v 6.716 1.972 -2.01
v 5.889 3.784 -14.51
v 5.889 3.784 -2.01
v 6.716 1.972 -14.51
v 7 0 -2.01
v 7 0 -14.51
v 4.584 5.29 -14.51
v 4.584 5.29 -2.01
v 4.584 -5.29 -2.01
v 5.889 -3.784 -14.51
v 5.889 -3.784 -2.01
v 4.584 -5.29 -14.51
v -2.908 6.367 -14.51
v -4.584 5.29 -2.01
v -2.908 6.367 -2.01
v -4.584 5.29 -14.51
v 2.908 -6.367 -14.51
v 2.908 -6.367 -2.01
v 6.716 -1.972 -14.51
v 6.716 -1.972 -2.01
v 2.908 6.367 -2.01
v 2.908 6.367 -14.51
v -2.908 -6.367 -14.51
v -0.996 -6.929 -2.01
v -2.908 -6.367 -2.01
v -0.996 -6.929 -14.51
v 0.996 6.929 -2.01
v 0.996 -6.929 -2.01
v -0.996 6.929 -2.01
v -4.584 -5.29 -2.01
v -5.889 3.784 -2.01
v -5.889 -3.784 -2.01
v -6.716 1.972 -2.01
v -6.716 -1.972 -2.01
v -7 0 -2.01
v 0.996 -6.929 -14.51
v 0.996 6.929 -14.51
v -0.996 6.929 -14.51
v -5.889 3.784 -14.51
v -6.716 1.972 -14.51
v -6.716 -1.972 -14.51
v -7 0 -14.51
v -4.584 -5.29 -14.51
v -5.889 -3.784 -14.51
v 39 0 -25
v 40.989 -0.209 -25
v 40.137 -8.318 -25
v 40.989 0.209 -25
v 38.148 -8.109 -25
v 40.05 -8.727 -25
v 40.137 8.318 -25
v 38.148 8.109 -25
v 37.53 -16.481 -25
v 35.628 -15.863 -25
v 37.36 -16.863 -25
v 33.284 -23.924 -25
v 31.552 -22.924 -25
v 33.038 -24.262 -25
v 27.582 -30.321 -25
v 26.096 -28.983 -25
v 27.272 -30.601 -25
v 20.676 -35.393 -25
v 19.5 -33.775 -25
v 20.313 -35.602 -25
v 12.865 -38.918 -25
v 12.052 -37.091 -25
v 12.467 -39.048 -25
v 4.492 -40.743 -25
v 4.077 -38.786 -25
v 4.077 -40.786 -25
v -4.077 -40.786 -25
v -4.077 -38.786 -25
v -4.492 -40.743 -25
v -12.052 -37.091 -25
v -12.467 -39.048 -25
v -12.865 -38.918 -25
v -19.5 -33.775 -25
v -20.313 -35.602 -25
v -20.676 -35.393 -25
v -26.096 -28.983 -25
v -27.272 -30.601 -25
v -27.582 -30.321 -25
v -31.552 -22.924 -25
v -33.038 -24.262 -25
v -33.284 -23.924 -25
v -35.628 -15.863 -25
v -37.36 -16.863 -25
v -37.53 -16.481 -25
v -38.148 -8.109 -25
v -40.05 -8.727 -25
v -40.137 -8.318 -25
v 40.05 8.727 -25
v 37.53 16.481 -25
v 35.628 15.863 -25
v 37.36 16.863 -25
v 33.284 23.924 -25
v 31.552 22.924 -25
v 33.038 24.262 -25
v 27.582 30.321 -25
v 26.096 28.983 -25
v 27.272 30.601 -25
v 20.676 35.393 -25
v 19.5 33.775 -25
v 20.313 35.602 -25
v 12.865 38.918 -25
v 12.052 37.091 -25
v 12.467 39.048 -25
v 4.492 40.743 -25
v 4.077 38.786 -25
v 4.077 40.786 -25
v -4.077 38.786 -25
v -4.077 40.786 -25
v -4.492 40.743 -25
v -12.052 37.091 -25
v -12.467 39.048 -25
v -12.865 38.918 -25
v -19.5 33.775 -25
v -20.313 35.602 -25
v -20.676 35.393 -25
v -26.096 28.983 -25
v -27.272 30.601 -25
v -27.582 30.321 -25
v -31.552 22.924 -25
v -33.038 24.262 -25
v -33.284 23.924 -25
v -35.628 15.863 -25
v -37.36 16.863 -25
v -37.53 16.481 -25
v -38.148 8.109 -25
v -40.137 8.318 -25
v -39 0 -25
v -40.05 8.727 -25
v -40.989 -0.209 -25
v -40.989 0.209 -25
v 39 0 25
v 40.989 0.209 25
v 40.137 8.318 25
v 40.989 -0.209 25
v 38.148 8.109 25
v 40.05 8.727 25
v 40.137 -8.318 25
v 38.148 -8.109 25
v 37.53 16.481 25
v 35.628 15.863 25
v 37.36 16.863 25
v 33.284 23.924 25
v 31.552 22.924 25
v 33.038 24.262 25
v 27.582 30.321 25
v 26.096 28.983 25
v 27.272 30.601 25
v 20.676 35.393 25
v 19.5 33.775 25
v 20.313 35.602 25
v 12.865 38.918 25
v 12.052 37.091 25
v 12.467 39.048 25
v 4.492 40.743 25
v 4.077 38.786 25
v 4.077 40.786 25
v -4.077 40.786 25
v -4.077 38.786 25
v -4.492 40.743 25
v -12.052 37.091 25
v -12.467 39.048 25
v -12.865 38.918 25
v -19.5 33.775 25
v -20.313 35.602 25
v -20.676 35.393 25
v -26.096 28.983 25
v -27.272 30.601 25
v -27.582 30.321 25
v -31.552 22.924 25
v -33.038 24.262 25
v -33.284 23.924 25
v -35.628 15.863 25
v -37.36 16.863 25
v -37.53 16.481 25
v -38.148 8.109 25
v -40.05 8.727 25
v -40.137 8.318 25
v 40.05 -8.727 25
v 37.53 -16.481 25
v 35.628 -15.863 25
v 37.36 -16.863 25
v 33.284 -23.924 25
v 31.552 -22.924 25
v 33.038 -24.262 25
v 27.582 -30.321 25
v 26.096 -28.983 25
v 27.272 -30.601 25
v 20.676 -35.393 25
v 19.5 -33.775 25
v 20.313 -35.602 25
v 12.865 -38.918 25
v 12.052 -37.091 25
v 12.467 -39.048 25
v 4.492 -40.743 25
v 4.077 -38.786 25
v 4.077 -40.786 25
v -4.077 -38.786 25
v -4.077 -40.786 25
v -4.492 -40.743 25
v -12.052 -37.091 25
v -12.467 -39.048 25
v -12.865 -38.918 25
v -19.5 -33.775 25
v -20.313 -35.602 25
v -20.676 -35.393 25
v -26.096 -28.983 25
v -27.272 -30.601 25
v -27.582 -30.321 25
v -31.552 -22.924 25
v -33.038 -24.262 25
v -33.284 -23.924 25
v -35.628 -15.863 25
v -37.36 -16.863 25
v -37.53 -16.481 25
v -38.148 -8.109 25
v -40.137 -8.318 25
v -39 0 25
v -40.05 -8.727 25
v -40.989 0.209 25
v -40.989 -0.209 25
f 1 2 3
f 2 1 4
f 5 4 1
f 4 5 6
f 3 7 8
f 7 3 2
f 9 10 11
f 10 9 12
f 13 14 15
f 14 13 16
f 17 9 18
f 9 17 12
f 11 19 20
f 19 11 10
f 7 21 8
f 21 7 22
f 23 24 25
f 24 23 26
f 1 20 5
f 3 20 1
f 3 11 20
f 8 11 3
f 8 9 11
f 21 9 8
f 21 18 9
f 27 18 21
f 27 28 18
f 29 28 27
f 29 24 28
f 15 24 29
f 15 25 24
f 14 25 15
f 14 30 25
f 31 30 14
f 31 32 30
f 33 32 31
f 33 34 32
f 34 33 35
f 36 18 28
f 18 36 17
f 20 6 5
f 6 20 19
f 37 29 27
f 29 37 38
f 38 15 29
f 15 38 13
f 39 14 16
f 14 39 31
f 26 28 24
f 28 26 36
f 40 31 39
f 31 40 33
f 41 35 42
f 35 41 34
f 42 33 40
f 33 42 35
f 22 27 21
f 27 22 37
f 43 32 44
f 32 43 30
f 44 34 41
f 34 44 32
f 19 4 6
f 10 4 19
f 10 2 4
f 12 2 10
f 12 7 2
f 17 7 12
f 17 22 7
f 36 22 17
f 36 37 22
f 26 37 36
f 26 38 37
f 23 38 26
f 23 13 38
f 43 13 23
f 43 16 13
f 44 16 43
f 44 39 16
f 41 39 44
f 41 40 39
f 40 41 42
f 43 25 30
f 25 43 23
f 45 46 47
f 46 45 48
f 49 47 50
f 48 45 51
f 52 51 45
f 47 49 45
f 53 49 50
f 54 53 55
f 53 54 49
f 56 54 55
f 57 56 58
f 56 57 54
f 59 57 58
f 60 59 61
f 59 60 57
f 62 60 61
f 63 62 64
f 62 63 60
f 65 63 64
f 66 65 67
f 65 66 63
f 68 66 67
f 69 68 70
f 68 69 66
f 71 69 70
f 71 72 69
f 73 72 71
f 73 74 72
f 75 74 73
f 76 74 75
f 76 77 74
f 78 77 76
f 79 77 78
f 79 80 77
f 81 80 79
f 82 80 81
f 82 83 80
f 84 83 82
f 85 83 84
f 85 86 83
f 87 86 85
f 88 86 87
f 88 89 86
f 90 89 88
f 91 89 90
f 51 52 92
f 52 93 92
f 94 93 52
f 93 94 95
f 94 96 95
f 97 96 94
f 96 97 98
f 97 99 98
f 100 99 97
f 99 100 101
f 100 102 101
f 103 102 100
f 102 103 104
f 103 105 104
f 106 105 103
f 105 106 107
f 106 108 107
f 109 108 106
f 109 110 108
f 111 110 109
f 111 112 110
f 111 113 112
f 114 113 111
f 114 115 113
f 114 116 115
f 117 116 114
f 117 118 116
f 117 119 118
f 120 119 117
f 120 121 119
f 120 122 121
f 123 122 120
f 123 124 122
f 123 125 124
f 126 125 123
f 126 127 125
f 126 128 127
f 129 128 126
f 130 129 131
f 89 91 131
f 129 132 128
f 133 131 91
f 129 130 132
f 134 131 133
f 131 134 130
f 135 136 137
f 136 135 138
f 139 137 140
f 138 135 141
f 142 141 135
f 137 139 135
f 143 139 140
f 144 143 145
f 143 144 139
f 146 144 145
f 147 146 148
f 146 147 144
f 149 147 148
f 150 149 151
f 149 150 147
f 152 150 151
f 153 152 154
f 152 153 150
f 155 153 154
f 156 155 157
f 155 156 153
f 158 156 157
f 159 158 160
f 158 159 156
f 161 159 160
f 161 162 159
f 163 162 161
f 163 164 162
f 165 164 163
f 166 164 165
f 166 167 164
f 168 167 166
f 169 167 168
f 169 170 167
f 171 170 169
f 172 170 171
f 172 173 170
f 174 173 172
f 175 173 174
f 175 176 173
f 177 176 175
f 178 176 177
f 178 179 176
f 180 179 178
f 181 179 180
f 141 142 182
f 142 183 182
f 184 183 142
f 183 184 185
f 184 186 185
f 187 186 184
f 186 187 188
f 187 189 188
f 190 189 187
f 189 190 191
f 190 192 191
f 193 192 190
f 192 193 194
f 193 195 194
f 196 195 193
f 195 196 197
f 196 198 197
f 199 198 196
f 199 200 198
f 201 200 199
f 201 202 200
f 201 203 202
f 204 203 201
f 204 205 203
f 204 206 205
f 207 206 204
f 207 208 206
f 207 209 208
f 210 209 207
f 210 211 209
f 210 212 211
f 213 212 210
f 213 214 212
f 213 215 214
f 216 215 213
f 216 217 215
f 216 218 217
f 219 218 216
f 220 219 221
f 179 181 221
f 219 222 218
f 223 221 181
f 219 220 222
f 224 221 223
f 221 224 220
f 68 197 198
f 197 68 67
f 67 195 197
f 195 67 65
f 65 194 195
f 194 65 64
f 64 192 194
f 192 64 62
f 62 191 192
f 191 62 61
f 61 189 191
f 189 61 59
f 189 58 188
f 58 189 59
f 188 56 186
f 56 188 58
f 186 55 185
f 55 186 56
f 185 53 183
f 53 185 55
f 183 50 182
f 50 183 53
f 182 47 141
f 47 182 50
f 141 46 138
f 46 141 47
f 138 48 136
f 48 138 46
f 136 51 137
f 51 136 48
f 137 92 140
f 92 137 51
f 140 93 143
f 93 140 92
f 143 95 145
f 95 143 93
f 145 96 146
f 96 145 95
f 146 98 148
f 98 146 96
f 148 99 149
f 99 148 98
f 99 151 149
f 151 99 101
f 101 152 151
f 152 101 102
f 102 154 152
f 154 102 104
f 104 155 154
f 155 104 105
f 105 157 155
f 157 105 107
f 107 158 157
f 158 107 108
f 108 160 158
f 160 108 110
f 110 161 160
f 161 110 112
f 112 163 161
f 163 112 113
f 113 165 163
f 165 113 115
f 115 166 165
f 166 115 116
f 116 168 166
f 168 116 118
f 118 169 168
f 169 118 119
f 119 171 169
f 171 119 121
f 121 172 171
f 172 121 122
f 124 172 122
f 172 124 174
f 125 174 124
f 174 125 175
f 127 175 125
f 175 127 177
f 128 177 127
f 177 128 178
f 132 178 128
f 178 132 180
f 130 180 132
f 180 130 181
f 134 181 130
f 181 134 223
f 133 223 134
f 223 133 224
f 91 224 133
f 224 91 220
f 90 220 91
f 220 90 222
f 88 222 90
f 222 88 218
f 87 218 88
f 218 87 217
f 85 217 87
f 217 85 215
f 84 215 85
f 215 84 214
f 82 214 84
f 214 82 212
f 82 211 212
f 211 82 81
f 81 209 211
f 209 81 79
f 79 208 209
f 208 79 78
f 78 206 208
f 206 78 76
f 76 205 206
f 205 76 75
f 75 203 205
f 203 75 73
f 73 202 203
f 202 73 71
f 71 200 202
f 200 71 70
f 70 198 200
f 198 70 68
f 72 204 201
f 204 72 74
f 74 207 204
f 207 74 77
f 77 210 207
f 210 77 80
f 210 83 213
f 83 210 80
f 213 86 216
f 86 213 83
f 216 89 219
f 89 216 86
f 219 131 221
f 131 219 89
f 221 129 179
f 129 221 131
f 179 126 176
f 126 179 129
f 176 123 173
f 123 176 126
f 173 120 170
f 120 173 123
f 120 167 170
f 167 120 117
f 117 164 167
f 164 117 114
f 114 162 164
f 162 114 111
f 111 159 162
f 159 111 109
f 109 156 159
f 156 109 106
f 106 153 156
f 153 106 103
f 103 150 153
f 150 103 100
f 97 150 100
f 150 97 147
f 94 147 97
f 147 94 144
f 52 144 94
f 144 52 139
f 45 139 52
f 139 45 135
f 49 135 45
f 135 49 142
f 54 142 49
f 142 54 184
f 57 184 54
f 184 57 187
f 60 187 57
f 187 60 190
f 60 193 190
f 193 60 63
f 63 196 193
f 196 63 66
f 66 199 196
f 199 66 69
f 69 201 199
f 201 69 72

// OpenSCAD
// file: RotorX.scad
//$fn = 50;

HubX = 11;
HubY = 5.2;
HubZ = 4;
ShaftRadius = 0.75;
TMountRadius = 1;

1104_Motor(HubX, HubY, HubZ, ShaftRadius, TMountRadius);

// 3020Propeller(HubX, HubY, HubZ, ShaftRadius, TMountRadius);

// translate([HubX / 4, 0, 0]) {
// 	M2x6mmScrew();// Right t-mount screw
// }
// translate([-HubX / 4, 0, 0]) {
// 	M2x6mmScrew();// Left t-mount screw
// }



module 1104_Motor(hubX, hubY, hubZ, shaftR, tmountR) {
	color("DimGray") {
		_motorR = 7;
		_motorHeight = 12.5;
		difference() {
			translate([0, 0, -8.26]) {	// TODO: What's the basis for this magic number?
				cylinder(r = _motorR, h = _motorHeight, center = true);
			}

			// Drive shaft
			cylinder(r = shaftR, h = hubZ, center = true);
		}
		
	}
}

module M2x6mmScrew() {
	color("DarkSlateGray") {
		translate([0, 0, 2.75]) {
			render() difference() {
				cylinder(r = 2, h = 1.5, center = true);
				cylinder(r = .85, h = 1.5, center = true);
			}
		}
		translate([0, 0, -1]) {
			cylinder(r = 1, h = 6, center = true);
		}
	}
}

module 3020Propeller(hubX, hubY, hubZ, shaftR, tmountR) {
	color("DarkOrange") {
		_bladeX = 33;
		_bladeY = 9;
		
		translate([_bladeX  - hubX, 0, 0]) {
			scale([1, _bladeY / _bladeX, 1]) {
				cylinder(d = _bladeX, h = 1, center = true);
			}
		}
		translate([-_bladeX  + hubX, 0, 0]) {
			scale([1, _bladeY / _bladeX, 1]) {
				cylinder(d = _bladeX, h = 1, center = true);
			}
		}
		render() difference() {
			// The hub
			scale([1, hubY / hubX, 1]) {
				cylinder(d = hubX, h = hubZ, center = true);
			}

			// Subtract the drive shaft & screw holes
			// Drive shaft
			cylinder(r = shaftR, h = hubZ, center = true);
			// Right T-Mount
			translate([hubX / 4, 0, 0]) {
				cylinder(r = tmountR, h = hubZ, center = true);
			}
			// Left T-Mount
			translate([-hubX / 4, 0, 0]) {
				cylinder(r = tmountR, h = hubZ, center = true);
			}
		}
	}
}
// main file
include <RotorX.scad>;

//$fn = 40;

_ductInnerDiameter = 78;



linear_extrude(height = 50, slices = 50, center = true) {
  difference() {
	offset(r = 2) {
		circle(d = _ductInnerDiameter, center = true);
	}
    circle(d = _ductInnerDiameter, center = true);
  }
}
